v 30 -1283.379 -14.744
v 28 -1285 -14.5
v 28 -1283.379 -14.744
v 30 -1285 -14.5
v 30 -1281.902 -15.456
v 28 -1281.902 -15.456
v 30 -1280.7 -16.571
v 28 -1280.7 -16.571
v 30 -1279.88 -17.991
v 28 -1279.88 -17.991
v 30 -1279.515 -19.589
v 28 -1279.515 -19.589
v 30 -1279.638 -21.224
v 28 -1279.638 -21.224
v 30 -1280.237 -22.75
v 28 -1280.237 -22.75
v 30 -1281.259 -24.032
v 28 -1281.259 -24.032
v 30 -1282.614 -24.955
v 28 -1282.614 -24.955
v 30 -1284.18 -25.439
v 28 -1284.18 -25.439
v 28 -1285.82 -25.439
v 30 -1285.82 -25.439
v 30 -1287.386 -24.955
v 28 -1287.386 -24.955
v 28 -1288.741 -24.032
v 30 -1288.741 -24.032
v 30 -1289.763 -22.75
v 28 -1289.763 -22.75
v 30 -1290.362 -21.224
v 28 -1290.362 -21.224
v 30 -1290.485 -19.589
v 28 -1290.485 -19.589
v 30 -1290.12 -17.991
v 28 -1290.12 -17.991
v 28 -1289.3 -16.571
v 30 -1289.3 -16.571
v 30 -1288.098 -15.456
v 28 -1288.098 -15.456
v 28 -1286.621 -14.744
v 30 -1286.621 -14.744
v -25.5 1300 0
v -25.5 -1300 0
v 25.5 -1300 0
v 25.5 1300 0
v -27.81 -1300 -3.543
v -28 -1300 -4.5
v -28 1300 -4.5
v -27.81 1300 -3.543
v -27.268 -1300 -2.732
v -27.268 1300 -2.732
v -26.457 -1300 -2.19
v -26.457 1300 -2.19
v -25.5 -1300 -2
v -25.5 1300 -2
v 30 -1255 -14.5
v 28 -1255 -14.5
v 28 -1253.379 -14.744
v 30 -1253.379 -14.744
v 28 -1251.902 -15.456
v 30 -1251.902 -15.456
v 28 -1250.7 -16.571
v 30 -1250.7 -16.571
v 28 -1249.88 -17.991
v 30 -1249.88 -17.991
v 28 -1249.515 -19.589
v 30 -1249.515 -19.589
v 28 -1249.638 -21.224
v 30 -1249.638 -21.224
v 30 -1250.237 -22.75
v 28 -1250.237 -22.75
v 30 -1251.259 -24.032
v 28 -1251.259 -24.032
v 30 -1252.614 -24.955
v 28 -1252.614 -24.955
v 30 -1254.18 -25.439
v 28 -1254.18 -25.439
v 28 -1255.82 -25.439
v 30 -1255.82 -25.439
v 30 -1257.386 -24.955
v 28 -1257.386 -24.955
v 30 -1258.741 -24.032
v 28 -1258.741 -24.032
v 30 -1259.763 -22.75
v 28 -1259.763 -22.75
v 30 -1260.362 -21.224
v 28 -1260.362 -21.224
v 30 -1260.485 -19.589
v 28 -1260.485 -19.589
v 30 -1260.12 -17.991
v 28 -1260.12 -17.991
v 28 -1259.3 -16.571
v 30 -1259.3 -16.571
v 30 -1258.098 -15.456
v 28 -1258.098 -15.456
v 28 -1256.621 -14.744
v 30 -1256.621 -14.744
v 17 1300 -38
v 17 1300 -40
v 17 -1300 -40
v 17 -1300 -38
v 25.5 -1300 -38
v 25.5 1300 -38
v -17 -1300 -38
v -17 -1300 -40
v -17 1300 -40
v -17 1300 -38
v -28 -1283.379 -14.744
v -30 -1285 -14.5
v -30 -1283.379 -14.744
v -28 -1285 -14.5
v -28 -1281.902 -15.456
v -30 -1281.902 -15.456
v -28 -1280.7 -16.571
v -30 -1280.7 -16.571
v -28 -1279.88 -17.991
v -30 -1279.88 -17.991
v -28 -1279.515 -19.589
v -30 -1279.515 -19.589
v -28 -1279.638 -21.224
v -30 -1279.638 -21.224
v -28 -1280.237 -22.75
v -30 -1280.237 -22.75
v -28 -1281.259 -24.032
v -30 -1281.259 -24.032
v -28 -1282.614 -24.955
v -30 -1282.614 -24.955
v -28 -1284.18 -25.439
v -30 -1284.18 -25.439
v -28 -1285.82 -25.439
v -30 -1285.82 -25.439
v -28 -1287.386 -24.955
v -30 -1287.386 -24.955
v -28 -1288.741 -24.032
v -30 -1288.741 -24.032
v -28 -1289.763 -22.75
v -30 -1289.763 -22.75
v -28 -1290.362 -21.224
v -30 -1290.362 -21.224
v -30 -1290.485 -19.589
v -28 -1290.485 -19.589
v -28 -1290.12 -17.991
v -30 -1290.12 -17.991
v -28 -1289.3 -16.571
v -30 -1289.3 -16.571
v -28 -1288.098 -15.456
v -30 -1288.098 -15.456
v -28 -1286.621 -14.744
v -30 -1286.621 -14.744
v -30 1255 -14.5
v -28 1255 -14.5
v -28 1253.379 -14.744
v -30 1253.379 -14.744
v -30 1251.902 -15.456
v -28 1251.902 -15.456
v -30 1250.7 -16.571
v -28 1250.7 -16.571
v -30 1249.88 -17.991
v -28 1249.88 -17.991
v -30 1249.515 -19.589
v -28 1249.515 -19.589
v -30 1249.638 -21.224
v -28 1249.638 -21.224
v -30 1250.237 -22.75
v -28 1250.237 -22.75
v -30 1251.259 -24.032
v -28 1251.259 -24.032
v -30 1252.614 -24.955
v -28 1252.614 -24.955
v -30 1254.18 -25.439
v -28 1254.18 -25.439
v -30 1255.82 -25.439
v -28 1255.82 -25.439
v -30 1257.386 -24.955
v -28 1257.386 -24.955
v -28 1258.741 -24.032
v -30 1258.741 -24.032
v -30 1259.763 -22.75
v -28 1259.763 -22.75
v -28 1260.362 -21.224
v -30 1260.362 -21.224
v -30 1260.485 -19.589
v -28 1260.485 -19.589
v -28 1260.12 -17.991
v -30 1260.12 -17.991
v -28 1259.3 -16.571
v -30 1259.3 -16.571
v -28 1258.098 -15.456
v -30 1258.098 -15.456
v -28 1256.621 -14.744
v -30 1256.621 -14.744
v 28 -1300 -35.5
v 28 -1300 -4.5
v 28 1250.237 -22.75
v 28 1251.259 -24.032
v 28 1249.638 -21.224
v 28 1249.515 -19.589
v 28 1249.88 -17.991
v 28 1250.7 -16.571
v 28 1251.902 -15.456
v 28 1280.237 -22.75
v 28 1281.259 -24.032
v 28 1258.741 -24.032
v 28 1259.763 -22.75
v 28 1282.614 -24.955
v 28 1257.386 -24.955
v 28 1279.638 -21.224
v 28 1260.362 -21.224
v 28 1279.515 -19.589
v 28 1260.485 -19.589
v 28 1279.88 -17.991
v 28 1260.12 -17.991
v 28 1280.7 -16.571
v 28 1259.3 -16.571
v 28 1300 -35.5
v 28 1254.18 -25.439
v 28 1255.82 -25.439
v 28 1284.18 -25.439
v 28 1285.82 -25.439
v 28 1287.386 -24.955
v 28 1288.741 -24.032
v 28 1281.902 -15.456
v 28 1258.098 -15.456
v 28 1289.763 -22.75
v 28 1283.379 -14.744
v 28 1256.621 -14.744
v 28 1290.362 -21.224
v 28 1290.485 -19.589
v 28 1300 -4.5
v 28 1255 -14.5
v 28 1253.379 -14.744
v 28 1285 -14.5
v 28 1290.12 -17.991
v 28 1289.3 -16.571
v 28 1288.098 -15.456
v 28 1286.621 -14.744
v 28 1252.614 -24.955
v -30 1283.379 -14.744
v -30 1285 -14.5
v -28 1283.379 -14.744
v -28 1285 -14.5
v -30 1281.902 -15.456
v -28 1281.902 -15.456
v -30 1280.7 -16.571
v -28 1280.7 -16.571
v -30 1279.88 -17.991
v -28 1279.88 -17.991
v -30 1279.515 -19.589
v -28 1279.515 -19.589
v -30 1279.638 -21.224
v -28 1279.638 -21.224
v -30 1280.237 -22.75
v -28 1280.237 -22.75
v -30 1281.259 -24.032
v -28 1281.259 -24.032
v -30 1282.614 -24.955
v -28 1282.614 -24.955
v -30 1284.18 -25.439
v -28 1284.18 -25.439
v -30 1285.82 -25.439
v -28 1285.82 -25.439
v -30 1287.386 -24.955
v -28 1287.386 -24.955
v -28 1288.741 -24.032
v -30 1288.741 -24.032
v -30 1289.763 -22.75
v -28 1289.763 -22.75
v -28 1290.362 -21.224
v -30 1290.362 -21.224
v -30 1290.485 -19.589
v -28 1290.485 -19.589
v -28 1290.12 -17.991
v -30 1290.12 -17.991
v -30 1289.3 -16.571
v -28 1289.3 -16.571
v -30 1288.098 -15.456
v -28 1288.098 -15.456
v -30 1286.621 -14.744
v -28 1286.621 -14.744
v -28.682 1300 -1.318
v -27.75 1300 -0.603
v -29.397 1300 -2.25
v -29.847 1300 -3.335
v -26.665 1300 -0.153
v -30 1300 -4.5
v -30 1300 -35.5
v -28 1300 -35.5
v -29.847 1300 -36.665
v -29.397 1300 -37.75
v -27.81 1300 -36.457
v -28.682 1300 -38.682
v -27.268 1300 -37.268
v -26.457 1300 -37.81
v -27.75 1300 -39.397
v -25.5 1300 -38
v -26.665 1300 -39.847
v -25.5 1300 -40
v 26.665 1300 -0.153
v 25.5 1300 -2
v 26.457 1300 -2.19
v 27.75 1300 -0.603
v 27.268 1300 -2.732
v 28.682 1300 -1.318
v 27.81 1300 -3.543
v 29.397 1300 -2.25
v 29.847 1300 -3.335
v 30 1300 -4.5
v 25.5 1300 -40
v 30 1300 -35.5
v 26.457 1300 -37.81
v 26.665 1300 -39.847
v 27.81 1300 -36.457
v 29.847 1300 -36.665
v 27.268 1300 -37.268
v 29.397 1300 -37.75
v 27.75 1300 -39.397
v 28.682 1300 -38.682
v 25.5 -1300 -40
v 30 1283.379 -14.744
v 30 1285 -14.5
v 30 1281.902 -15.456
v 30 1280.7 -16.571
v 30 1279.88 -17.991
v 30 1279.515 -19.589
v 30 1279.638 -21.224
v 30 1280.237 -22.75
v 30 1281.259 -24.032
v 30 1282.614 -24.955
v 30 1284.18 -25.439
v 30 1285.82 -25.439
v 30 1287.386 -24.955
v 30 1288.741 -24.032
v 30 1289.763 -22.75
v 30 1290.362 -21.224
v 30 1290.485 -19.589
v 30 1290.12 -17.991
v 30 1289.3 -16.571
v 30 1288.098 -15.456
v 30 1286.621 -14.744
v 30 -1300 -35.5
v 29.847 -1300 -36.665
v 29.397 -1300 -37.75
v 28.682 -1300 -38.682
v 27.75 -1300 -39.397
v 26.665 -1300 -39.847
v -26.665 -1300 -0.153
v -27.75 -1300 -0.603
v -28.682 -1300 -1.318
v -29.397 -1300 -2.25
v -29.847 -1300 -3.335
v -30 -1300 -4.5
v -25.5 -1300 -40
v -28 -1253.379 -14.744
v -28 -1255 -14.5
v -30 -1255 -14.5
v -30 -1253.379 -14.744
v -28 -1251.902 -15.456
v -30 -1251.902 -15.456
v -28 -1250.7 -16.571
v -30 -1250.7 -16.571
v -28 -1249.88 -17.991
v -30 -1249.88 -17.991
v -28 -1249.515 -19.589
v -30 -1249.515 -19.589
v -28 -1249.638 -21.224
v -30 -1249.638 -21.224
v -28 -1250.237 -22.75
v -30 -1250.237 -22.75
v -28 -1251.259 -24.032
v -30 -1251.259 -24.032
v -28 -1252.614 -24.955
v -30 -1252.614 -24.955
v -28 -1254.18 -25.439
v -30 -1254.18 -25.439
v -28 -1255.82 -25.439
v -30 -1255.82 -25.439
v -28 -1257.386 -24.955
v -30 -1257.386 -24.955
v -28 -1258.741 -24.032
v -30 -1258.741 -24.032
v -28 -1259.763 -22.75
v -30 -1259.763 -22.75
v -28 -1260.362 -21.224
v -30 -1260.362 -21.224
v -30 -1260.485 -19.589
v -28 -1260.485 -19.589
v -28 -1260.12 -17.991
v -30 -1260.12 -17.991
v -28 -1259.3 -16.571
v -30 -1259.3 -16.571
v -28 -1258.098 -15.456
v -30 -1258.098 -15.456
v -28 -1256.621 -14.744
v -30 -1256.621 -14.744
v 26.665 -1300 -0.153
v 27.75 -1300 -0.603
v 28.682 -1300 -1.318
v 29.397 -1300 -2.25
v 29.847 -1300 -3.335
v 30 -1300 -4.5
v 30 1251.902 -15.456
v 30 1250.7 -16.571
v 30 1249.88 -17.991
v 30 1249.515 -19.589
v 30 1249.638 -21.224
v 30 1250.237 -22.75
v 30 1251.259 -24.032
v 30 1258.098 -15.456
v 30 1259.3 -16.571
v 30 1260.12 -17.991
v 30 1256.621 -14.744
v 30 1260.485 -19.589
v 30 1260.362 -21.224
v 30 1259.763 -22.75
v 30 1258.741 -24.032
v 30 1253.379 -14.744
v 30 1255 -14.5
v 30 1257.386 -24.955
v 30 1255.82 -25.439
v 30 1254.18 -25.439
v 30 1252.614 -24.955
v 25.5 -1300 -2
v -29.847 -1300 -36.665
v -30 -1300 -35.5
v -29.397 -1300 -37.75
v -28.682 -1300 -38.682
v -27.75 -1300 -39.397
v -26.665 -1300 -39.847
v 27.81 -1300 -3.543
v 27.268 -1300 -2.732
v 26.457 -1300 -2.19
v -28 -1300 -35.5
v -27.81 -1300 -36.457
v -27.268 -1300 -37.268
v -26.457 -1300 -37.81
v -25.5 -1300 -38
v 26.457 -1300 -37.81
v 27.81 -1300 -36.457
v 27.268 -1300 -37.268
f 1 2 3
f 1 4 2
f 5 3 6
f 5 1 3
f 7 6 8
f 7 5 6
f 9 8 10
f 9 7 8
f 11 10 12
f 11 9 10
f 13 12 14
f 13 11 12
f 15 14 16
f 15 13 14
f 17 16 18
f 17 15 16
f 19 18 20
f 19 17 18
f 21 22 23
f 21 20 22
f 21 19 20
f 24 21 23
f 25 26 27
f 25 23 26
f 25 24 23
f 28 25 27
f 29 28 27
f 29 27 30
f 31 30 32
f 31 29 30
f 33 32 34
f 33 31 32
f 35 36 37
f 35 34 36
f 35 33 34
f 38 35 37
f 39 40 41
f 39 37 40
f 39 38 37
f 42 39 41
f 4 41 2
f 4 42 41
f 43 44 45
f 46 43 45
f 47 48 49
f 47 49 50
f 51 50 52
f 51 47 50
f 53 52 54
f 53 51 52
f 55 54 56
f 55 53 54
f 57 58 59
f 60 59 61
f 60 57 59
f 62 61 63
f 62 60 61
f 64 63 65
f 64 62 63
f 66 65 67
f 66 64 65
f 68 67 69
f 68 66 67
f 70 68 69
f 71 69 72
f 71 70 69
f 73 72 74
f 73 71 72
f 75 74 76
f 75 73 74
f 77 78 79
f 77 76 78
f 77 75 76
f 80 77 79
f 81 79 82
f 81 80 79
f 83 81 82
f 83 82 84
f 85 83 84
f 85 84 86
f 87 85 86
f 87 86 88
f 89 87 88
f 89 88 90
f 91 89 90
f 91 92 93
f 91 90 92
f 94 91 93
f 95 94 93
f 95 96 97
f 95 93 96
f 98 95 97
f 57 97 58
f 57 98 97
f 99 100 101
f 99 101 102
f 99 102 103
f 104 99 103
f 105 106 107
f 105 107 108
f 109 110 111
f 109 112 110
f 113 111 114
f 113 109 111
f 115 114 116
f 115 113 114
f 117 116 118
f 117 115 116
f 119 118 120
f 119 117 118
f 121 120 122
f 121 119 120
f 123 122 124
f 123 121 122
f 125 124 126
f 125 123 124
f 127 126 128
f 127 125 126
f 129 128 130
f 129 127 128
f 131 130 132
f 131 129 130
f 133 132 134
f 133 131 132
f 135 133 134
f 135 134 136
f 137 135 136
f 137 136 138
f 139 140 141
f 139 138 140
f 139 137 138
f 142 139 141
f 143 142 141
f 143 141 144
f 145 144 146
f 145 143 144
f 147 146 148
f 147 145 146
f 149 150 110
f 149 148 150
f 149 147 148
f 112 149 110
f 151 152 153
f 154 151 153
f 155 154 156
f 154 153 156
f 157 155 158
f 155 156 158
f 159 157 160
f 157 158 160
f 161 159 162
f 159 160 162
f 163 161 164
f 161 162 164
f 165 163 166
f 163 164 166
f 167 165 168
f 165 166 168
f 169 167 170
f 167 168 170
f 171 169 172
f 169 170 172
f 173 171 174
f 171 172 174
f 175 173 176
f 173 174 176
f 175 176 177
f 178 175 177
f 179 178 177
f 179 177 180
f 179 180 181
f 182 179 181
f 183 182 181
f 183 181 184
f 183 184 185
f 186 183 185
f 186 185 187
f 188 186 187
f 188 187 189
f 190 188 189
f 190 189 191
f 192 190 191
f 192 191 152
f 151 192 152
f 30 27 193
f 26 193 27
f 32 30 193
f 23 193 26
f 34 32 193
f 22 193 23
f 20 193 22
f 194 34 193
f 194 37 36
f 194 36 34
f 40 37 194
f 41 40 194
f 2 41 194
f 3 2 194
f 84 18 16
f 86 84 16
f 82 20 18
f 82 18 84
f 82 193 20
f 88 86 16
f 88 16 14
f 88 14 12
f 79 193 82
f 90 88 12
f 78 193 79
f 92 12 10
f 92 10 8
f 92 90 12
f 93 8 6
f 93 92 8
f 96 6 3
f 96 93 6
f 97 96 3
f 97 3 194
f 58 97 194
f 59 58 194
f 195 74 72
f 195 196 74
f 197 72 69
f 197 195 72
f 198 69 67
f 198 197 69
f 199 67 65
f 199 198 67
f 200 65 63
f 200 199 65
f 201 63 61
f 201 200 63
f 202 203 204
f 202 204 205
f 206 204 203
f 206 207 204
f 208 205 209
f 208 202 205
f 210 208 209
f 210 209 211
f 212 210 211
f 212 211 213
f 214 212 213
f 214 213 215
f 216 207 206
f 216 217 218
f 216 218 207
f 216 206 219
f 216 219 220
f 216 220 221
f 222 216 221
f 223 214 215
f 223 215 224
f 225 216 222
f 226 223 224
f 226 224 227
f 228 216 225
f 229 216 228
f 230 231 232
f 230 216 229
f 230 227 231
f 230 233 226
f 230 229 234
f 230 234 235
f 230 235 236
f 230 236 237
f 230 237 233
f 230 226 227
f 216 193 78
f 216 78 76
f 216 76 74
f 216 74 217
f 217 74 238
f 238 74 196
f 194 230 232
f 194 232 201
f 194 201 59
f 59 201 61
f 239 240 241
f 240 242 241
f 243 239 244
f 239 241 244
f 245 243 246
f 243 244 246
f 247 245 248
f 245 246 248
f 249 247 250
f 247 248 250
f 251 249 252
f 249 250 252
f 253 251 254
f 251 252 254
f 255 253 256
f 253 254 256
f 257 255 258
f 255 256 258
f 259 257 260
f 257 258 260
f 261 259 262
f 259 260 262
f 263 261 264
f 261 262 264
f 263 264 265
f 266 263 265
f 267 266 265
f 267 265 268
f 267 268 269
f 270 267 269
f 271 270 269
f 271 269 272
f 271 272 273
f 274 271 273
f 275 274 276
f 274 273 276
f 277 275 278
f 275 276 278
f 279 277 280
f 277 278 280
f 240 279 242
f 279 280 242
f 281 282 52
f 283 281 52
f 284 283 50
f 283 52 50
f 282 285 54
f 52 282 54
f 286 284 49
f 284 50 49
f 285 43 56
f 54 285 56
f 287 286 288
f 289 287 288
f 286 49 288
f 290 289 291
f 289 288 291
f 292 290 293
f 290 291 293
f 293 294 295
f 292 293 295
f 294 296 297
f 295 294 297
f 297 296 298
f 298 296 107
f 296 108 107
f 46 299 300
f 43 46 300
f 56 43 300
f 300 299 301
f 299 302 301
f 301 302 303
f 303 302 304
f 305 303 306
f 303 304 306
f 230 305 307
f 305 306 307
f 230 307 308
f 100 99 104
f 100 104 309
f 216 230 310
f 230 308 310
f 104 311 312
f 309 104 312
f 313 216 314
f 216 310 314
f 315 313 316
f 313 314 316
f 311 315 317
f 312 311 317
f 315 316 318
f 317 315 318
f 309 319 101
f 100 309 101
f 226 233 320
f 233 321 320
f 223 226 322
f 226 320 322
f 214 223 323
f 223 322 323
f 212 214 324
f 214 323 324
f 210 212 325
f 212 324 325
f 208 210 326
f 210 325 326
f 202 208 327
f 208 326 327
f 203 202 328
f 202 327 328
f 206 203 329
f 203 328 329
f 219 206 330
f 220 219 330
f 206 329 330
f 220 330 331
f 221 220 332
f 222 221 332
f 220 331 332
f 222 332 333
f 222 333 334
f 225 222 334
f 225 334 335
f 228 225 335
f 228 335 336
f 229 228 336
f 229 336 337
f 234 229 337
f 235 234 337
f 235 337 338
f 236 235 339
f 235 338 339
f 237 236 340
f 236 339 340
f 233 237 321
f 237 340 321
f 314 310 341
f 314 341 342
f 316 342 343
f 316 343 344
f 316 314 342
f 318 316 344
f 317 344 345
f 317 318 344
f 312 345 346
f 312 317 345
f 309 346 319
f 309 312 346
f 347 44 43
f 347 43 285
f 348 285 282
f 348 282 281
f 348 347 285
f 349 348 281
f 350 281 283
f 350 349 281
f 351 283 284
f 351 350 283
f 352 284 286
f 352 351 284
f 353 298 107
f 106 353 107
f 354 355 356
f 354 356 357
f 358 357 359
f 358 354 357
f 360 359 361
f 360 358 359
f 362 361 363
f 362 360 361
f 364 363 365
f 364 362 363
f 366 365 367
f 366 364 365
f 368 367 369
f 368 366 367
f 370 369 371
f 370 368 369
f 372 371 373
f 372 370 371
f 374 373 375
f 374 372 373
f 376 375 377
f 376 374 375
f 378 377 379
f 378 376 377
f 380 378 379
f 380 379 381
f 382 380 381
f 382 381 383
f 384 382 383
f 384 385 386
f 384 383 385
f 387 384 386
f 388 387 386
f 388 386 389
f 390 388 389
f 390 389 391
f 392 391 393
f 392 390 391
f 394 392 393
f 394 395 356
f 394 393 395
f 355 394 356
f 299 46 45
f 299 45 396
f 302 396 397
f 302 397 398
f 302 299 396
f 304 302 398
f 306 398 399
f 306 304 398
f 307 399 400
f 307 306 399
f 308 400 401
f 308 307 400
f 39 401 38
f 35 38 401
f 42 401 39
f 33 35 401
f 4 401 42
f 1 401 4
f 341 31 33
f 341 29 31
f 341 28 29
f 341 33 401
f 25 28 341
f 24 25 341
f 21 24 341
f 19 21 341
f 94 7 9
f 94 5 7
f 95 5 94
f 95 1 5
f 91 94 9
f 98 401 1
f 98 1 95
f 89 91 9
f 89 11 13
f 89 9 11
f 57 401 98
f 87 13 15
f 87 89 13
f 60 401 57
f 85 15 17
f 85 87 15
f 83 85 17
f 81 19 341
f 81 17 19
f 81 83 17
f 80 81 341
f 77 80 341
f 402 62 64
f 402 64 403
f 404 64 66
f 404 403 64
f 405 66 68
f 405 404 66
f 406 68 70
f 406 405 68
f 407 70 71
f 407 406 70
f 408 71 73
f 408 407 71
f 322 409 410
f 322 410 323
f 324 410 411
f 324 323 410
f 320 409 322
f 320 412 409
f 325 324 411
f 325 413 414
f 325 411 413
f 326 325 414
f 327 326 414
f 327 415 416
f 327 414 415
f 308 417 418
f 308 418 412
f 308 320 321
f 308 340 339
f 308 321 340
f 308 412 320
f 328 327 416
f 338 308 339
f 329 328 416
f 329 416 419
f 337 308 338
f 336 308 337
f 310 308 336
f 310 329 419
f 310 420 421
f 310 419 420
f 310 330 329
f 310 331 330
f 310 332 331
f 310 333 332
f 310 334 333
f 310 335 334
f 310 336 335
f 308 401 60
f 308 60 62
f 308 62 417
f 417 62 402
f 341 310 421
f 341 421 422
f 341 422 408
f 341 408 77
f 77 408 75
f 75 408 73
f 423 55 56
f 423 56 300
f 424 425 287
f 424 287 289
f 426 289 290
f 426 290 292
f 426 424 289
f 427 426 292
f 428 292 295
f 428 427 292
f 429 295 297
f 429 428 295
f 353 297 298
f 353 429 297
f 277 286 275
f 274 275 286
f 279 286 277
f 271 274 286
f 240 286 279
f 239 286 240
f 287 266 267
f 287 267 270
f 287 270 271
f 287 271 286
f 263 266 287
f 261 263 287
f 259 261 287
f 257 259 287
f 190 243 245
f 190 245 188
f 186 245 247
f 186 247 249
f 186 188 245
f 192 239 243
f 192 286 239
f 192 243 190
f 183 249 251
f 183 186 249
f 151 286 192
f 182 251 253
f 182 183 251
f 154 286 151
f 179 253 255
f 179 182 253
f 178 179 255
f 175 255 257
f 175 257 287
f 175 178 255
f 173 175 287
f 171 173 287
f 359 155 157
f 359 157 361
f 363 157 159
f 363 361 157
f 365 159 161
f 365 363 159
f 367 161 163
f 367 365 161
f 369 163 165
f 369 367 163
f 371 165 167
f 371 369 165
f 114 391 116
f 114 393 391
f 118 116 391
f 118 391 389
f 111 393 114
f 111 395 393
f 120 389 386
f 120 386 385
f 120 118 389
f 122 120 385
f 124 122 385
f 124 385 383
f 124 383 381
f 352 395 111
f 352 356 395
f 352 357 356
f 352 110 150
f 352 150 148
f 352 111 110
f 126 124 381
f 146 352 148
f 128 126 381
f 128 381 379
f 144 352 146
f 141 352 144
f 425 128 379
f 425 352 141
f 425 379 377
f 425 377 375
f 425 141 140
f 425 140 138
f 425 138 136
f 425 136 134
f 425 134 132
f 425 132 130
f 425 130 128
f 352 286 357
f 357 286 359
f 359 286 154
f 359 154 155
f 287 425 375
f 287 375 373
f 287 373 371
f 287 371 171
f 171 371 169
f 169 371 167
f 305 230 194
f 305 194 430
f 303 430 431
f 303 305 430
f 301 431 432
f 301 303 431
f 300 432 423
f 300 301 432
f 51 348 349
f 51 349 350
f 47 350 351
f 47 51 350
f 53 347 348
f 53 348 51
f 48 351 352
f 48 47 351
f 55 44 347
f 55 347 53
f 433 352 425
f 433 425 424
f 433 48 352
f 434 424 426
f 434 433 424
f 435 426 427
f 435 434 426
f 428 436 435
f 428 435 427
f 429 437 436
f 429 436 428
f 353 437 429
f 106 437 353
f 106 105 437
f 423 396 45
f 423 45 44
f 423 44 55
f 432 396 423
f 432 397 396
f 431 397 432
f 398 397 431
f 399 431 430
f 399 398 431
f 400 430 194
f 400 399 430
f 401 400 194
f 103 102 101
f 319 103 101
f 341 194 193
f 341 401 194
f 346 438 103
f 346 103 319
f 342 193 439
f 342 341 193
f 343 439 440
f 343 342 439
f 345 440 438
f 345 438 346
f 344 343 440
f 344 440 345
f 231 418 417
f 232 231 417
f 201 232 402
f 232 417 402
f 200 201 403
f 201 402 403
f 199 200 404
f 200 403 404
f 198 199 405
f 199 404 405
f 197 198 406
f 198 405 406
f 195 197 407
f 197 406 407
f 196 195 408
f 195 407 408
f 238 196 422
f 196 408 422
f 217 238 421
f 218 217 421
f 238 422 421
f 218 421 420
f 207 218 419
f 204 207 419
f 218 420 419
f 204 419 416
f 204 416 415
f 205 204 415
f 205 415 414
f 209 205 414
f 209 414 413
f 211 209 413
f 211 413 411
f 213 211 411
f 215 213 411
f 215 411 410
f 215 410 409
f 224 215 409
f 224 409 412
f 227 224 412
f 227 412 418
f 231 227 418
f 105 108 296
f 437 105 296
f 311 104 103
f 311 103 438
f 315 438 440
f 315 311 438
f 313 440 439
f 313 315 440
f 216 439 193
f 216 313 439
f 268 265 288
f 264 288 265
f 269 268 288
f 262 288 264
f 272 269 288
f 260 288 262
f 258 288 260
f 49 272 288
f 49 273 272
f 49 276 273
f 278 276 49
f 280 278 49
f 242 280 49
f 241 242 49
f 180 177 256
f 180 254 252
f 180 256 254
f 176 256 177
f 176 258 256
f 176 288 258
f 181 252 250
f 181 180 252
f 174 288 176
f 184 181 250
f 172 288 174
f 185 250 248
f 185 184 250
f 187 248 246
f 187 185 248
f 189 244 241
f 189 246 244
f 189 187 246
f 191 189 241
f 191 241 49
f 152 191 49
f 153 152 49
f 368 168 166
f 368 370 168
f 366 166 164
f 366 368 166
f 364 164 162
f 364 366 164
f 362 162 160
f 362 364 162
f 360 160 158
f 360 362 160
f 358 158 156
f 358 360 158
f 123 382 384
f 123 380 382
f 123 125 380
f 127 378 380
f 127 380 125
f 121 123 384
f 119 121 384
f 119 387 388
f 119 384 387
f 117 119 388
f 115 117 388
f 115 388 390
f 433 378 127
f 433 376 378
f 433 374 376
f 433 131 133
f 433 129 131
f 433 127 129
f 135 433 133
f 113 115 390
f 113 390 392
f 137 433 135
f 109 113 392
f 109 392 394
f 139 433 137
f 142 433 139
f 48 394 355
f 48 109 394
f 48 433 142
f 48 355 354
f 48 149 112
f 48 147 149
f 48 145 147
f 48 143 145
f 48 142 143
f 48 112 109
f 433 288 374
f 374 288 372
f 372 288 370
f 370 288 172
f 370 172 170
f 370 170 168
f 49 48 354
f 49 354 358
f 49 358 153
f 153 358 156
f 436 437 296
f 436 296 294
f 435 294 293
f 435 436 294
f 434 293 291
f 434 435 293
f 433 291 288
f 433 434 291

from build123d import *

# Parameters (mm, degrees)
SKETCH1_W                      = 60
SKETCH1_H                      = 2600
BASE_FLANGE1_DEPTH             = 2
EDGE_FLANGE1_STRIP_W           = 13
EDGE_FLANGE1_STRIP_H           = 2
EDGE_FLANGE1_STRIP_CUT_DEPTH   = 2600
EDGE_FLANGE1_STRIP_2_W         = 13
EDGE_FLANGE1_STRIP_2_H         = 2
EDGE_FLANGE1_STRIP_CUT_2_DEPTH = 2600
EDGE_FLANGE1_DEPTH             = 2600
EDGE_FLANGE1_BEND_DEPTH        = 2600
EDGE_FLANGE2_STRIP_W           = 13
EDGE_FLANGE2_STRIP_H           = 2
EDGE_FLANGE2_STRIP_CUT_DEPTH   = 2600
EDGE_FLANGE2_STRIP_2_W         = 13
EDGE_FLANGE2_STRIP_2_H         = 2
EDGE_FLANGE2_STRIP_CUT_2_DEPTH = 2600
EDGE_FLANGE2_DEPTH             = 2600
EDGE_FLANGE2_BEND_DEPTH        = 2600
SKETCH18_R                     = 5.5
CUT_EXTRUDE1_DEPTH             = 1302.998463901


# Sheet-metal steps are written as plain solids
with BuildPart() as part:
    # Sketch1 → Base-Flange1 (new body)
    with BuildSketch(Plane.XY):
        Rectangle(SKETCH1_W, SKETCH1_H)
    extrude(amount=-BASE_FLANGE1_DEPTH)

    # Edge-Flange1 strip (across the edge) → Edge-Flange1 strip cut (cut)
    with BuildSketch(Plane(origin=(30, 1300, -2), x_dir=(-1, 0, 0), z_dir=(0, -1, 0))):
        with Locations((-2, -1)):
            Rectangle(EDGE_FLANGE1_STRIP_W, EDGE_FLANGE1_STRIP_H)
    extrude(amount=EDGE_FLANGE1_STRIP_CUT_DEPTH, mode=Mode.SUBTRACT)

    # Edge-Flange1 strip 2 (across the edge) → Edge-Flange1 strip cut 2 (cut)
    with BuildSketch(Plane(origin=(-30, -1300, -2), x_dir=(1, 0, 0), z_dir=(0, 1, 0))):
        with Locations((-2, -1)):
            Rectangle(EDGE_FLANGE1_STRIP_2_W, EDGE_FLANGE1_STRIP_2_H)
    extrude(amount=EDGE_FLANGE1_STRIP_CUT_2_DEPTH, mode=Mode.SUBTRACT)

    # Edge-Flange1 section (across the edge) → Edge-Flange1 (add)
    with BuildSketch(Plane(origin=(30, 1300, -2), x_dir=(-1, 0, 0), z_dir=(0, -1, 0))):
        with BuildLine():
            Line((0, 2.5), (0, 38))
            Line((0, 38), (2, 38))
            Line((2, 38), (2, 2.5))
            ThreePointArc((2, 2.5), (2.732233047, 0.732233047), (4.5, 0))
            Line((4.5, 0), (4.5, -2))
            ThreePointArc((4.5, -2), (1.318019485, -0.681980515), (0, 2.5))
        make_face()
    extrude(amount=EDGE_FLANGE1_DEPTH)

    # Edge-Flange1 section 2 (across the edge) → Edge-Flange1 bend (add)
    with BuildSketch(Plane(origin=(-30, -1300, -2), x_dir=(1, 0, 0), z_dir=(0, 1, 0))):
        with BuildLine():
            Line((0, 2.5), (0, 38))
            Line((0, 38), (2, 38))
            Line((2, 38), (2, 2.5))
            ThreePointArc((2, 2.5), (2.732233047, 0.732233047), (4.5, 0))
            Line((4.5, 0), (4.5, -2))
            ThreePointArc((4.5, -2), (1.318019485, -0.681980515), (0, 2.5))
        make_face()
    extrude(amount=EDGE_FLANGE1_BEND_DEPTH)

    # Edge-Flange2 strip (across the edge) → Edge-Flange2 strip cut (cut)
    with BuildSketch(Plane(origin=(28, 1300, -40), x_dir=(0, 0, 1), z_dir=(0, -1, 0))):
        with Locations((-2, -1)):
            Rectangle(EDGE_FLANGE2_STRIP_W, EDGE_FLANGE2_STRIP_H)
    extrude(amount=EDGE_FLANGE2_STRIP_CUT_DEPTH, mode=Mode.SUBTRACT)

    # Edge-Flange2 strip 2 (across the edge) → Edge-Flange2 strip cut 2 (cut)
    with BuildSketch(Plane(origin=(-28, -1300, -40), x_dir=(0, 0, 1), z_dir=(0, 1, 0))):
        with Locations((-2, -1)):
            Rectangle(EDGE_FLANGE2_STRIP_2_W, EDGE_FLANGE2_STRIP_2_H)
    extrude(amount=EDGE_FLANGE2_STRIP_CUT_2_DEPTH, mode=Mode.SUBTRACT)

    # Edge-Flange2 section (across the edge) → Edge-Flange2 (add)
    with BuildSketch(Plane(origin=(28, 1300, -40), x_dir=(0, 0, 1), z_dir=(0, -1, 0))):
        with BuildLine():
            Line((0, 2.5), (0, 11))
            Line((0, 11), (2, 11))
            Line((2, 11), (2, 2.5))
            ThreePointArc((2, 2.5), (2.732233047, 0.732233047), (4.5, 0))
            Line((4.5, 0), (4.5, -2))
            ThreePointArc((4.5, -2), (1.318019485, -0.681980515), (0, 2.5))
        make_face()
    extrude(amount=EDGE_FLANGE2_DEPTH)

    # Edge-Flange2 section 2 (across the edge) → Edge-Flange2 bend (add)
    with BuildSketch(Plane(origin=(-28, -1300, -40), x_dir=(0, 0, 1), z_dir=(0, 1, 0))):
        with BuildLine():
            Line((0, 2.5), (0, 11))
            Line((0, 11), (2, 11))
            Line((2, 11), (2, 2.5))
            ThreePointArc((2, 2.5), (2.732233047, 0.732233047), (4.5, 0))
            Line((4.5, 0), (4.5, -2))
            ThreePointArc((4.5, -2), (1.318019485, -0.681980515), (0, 2.5))
        make_face()
    extrude(amount=EDGE_FLANGE2_BEND_DEPTH)

    # Sketch18 → Cut-Extrude1 (cut, symmetric)
    with BuildSketch(Plane(origin=(30, 0, 0), x_dir=(0, 0, -1), z_dir=(1, 0, 0))):
        with Locations(Location((20, 1255, 0), (0, 0, 180))):
            Circle(SKETCH18_R)
        with Locations(Location((20, 1285, 0), (0, 0, 180))):
            Circle(SKETCH18_R)
    cut_extrude1 = extrude(amount=CUT_EXTRUDE1_DEPTH, both=True, mode=Mode.SUBTRACT)

    # Mirror1: Cut-Extrude1 across plane
    add(cut_extrude1.mirror(Plane.ZX), mode=Mode.SUBTRACT)


solid = part.part
